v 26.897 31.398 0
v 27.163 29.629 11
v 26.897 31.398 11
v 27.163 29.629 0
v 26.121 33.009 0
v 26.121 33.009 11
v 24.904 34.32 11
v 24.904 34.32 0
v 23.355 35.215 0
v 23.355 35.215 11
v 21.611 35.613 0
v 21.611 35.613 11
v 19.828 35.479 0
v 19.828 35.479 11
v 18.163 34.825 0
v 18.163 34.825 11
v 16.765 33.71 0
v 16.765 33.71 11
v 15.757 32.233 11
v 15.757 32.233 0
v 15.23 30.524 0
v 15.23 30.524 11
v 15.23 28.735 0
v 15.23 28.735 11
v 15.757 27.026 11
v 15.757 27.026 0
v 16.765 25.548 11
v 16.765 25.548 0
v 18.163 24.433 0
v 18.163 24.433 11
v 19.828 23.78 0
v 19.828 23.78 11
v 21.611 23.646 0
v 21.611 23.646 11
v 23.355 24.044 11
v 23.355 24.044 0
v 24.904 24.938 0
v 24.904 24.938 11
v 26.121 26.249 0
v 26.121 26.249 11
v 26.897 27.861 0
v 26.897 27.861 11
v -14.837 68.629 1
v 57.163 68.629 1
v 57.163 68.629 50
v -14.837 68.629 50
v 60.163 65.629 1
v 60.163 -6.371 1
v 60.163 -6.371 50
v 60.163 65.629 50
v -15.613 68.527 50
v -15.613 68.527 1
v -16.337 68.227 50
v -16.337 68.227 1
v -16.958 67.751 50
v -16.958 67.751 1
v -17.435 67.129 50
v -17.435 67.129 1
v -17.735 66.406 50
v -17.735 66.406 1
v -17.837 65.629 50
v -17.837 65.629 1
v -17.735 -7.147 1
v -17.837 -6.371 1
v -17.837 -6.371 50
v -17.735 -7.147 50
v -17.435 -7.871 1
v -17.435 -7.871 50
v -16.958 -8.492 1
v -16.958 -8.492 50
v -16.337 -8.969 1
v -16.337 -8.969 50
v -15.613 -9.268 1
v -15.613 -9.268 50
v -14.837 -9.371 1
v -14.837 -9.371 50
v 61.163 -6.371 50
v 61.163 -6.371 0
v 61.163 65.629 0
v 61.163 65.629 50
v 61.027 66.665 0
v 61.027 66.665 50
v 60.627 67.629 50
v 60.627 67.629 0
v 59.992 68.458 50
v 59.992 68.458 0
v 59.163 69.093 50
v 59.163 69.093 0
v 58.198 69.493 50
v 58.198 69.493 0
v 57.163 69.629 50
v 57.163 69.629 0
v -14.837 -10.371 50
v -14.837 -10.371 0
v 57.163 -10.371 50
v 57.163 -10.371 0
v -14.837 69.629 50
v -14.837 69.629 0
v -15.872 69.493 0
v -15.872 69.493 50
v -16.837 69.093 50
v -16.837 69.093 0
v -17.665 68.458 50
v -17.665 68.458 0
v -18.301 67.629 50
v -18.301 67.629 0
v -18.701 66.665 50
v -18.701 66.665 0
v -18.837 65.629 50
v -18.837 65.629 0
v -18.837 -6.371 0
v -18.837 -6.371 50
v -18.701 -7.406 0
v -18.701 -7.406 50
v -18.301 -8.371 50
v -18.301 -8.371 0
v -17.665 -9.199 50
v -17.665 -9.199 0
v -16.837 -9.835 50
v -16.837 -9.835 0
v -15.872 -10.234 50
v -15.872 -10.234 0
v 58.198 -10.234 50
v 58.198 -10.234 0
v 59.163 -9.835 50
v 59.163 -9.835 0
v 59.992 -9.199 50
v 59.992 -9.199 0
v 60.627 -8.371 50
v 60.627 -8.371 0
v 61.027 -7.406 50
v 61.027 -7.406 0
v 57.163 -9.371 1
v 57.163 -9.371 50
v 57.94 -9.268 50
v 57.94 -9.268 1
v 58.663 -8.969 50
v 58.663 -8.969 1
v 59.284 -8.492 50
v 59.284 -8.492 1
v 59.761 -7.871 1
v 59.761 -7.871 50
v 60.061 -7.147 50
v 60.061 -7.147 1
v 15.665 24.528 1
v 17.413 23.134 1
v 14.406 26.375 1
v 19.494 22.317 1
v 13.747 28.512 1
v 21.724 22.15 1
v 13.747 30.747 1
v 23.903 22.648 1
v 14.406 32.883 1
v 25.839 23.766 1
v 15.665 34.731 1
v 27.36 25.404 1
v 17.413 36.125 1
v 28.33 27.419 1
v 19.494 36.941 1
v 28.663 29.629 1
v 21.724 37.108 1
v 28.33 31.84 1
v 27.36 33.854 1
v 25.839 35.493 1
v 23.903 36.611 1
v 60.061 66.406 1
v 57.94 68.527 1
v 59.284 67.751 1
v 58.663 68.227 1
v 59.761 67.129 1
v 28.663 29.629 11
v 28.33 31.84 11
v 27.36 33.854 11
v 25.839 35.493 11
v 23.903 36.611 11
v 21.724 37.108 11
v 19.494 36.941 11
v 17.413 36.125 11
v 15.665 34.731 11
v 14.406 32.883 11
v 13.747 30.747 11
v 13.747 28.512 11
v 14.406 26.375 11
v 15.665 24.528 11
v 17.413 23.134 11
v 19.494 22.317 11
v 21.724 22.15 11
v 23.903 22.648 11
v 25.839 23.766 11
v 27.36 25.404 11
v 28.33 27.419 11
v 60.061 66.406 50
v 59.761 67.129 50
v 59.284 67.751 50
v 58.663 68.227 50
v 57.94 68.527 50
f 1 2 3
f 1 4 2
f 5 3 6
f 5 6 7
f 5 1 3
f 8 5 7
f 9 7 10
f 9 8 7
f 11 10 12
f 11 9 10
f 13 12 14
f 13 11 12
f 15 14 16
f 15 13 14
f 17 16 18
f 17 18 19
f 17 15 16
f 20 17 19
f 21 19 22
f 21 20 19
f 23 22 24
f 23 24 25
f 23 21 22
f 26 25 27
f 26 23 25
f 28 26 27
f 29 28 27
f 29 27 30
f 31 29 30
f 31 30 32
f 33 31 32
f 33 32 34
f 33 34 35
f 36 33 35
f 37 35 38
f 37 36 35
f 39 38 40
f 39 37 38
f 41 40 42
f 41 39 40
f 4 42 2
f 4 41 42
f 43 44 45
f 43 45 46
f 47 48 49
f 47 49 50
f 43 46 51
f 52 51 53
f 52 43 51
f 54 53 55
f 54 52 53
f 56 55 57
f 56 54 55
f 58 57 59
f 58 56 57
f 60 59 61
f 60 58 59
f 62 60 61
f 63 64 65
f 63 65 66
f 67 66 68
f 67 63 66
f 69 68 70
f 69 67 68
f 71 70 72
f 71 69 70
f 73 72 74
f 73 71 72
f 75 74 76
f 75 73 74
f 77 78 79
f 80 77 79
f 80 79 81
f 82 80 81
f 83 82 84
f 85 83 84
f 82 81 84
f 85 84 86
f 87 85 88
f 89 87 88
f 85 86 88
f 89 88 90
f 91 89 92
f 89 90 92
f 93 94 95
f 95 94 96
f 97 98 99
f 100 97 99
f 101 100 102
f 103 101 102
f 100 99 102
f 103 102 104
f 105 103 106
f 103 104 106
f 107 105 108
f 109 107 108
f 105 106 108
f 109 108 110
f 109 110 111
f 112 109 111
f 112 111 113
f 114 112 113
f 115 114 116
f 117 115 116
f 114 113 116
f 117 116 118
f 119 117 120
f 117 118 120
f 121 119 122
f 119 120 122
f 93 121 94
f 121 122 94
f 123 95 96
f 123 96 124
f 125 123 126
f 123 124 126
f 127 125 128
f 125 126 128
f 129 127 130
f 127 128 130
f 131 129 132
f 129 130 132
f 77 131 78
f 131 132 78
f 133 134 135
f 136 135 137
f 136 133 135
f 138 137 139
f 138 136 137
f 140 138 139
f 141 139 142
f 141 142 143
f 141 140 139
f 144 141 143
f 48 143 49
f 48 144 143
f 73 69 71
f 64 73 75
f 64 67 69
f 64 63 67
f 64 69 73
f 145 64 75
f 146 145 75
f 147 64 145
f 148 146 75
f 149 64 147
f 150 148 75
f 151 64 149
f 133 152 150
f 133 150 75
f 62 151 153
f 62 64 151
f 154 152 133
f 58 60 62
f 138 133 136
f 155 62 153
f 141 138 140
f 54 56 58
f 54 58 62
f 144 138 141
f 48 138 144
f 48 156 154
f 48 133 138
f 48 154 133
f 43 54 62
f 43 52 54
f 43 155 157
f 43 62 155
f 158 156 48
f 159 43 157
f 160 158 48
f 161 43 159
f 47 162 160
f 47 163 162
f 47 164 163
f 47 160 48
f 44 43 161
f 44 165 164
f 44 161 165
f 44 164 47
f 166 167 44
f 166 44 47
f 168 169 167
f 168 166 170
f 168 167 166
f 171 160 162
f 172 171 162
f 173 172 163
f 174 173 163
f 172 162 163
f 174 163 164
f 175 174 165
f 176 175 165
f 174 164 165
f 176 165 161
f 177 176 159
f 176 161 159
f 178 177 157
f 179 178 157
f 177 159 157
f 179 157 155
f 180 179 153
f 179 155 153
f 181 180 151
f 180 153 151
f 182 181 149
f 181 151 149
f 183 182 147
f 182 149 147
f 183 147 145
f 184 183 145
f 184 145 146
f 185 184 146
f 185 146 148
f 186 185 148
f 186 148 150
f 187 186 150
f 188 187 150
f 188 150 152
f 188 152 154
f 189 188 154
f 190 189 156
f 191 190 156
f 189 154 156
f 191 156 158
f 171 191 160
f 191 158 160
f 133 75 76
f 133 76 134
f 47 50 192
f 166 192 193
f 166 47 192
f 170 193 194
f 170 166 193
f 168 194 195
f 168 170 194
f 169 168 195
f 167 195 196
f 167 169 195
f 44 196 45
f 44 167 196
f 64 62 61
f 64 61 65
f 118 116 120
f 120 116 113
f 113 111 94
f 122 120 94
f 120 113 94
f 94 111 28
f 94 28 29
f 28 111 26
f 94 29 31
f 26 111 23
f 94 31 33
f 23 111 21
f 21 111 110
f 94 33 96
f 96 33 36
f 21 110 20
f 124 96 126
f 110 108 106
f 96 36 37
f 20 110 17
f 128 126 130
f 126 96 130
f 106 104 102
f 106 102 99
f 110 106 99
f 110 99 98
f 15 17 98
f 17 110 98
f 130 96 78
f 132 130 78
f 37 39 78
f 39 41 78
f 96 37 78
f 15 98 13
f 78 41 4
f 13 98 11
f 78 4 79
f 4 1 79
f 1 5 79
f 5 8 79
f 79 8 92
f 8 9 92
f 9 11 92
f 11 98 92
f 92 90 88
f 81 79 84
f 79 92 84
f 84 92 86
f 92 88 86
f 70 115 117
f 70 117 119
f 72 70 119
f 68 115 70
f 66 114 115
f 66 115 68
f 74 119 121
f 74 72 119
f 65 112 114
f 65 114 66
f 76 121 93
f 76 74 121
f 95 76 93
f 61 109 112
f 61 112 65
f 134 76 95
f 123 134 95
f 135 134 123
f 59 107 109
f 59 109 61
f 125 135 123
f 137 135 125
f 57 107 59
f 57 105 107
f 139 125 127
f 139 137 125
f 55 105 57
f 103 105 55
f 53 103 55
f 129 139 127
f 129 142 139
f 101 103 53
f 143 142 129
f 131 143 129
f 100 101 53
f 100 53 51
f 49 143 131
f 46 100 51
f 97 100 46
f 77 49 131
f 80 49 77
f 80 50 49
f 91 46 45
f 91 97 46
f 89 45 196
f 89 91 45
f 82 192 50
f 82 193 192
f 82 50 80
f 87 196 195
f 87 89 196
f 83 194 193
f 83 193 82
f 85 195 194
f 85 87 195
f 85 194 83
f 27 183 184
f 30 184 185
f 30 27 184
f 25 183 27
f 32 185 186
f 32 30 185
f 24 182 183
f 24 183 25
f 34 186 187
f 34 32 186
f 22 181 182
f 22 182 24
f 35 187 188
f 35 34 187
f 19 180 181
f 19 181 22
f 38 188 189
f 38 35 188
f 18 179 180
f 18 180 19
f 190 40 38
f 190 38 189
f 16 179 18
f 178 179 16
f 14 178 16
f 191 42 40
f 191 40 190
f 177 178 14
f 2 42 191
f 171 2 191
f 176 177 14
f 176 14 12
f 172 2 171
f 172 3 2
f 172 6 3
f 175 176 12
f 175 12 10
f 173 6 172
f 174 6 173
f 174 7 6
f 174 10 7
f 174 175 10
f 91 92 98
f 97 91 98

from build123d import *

# Parameters (mm, degrees)
F1_DEPTH = 50
F2_T     = -1
F3_R     = 6
F4_DEPTH = 1
F3_R_2   = 7.5
F6_DEPTH = 10


with BuildPart() as f1:
    # F0 (on Top) → F1 (new body)
    with BuildSketch(Plane.XY):
        with BuildLine():
            Line((57.163118, 69.629326), (-14.836882, 69.629326))
            ThreePointArc((-14.836882, 69.629326), (-17.665309, 68.457753), (-18.836882, 65.629326))
            Line((-18.836882, 65.629326), (-18.836882, -6.370674))
            ThreePointArc((-18.836882, -6.370674), (-17.665309, -9.199101), (-14.836882, -10.370674))
            Line((-14.836882, -10.370674), (57.163118, -10.370674))
            ThreePointArc((57.163118, -10.370674), (59.991545, -9.199101), (61.163118, -6.370674))
            Line((61.163118, -6.370674), (61.163118, 65.629326))
            ThreePointArc((61.163118, 65.629326), (59.991545, 68.457753), (57.163118, 69.629326))
        make_face()
    extrude(amount=F1_DEPTH)

    # F2
    f2_openings = [f1.faces().sort_by_distance(p)[0] for p in [
        (21.163118, 29.629326, 50),
    ]]
    offset(amount=F2_T, openings=f2_openings)

    # F3 (on face) → F4 (cut, through all)
    with BuildSketch(Plane.XY.offset(1)):
        with Locations((21.163118, 29.629326)):
            Circle(F3_R)
    extrude(amount=-F4_DEPTH, mode=Mode.SUBTRACT)

    # F3 (on face) → F6 (join)
    with BuildSketch(Plane.XY.offset(1)):
        with Locations((21.163118, 29.629326)):
            Circle(F3_R_2)
        with Locations((21.163118, 29.629326)):
            Circle(F3_R, mode=Mode.SUBTRACT)
    extrude(amount=F6_DEPTH)


solid = f1.part
